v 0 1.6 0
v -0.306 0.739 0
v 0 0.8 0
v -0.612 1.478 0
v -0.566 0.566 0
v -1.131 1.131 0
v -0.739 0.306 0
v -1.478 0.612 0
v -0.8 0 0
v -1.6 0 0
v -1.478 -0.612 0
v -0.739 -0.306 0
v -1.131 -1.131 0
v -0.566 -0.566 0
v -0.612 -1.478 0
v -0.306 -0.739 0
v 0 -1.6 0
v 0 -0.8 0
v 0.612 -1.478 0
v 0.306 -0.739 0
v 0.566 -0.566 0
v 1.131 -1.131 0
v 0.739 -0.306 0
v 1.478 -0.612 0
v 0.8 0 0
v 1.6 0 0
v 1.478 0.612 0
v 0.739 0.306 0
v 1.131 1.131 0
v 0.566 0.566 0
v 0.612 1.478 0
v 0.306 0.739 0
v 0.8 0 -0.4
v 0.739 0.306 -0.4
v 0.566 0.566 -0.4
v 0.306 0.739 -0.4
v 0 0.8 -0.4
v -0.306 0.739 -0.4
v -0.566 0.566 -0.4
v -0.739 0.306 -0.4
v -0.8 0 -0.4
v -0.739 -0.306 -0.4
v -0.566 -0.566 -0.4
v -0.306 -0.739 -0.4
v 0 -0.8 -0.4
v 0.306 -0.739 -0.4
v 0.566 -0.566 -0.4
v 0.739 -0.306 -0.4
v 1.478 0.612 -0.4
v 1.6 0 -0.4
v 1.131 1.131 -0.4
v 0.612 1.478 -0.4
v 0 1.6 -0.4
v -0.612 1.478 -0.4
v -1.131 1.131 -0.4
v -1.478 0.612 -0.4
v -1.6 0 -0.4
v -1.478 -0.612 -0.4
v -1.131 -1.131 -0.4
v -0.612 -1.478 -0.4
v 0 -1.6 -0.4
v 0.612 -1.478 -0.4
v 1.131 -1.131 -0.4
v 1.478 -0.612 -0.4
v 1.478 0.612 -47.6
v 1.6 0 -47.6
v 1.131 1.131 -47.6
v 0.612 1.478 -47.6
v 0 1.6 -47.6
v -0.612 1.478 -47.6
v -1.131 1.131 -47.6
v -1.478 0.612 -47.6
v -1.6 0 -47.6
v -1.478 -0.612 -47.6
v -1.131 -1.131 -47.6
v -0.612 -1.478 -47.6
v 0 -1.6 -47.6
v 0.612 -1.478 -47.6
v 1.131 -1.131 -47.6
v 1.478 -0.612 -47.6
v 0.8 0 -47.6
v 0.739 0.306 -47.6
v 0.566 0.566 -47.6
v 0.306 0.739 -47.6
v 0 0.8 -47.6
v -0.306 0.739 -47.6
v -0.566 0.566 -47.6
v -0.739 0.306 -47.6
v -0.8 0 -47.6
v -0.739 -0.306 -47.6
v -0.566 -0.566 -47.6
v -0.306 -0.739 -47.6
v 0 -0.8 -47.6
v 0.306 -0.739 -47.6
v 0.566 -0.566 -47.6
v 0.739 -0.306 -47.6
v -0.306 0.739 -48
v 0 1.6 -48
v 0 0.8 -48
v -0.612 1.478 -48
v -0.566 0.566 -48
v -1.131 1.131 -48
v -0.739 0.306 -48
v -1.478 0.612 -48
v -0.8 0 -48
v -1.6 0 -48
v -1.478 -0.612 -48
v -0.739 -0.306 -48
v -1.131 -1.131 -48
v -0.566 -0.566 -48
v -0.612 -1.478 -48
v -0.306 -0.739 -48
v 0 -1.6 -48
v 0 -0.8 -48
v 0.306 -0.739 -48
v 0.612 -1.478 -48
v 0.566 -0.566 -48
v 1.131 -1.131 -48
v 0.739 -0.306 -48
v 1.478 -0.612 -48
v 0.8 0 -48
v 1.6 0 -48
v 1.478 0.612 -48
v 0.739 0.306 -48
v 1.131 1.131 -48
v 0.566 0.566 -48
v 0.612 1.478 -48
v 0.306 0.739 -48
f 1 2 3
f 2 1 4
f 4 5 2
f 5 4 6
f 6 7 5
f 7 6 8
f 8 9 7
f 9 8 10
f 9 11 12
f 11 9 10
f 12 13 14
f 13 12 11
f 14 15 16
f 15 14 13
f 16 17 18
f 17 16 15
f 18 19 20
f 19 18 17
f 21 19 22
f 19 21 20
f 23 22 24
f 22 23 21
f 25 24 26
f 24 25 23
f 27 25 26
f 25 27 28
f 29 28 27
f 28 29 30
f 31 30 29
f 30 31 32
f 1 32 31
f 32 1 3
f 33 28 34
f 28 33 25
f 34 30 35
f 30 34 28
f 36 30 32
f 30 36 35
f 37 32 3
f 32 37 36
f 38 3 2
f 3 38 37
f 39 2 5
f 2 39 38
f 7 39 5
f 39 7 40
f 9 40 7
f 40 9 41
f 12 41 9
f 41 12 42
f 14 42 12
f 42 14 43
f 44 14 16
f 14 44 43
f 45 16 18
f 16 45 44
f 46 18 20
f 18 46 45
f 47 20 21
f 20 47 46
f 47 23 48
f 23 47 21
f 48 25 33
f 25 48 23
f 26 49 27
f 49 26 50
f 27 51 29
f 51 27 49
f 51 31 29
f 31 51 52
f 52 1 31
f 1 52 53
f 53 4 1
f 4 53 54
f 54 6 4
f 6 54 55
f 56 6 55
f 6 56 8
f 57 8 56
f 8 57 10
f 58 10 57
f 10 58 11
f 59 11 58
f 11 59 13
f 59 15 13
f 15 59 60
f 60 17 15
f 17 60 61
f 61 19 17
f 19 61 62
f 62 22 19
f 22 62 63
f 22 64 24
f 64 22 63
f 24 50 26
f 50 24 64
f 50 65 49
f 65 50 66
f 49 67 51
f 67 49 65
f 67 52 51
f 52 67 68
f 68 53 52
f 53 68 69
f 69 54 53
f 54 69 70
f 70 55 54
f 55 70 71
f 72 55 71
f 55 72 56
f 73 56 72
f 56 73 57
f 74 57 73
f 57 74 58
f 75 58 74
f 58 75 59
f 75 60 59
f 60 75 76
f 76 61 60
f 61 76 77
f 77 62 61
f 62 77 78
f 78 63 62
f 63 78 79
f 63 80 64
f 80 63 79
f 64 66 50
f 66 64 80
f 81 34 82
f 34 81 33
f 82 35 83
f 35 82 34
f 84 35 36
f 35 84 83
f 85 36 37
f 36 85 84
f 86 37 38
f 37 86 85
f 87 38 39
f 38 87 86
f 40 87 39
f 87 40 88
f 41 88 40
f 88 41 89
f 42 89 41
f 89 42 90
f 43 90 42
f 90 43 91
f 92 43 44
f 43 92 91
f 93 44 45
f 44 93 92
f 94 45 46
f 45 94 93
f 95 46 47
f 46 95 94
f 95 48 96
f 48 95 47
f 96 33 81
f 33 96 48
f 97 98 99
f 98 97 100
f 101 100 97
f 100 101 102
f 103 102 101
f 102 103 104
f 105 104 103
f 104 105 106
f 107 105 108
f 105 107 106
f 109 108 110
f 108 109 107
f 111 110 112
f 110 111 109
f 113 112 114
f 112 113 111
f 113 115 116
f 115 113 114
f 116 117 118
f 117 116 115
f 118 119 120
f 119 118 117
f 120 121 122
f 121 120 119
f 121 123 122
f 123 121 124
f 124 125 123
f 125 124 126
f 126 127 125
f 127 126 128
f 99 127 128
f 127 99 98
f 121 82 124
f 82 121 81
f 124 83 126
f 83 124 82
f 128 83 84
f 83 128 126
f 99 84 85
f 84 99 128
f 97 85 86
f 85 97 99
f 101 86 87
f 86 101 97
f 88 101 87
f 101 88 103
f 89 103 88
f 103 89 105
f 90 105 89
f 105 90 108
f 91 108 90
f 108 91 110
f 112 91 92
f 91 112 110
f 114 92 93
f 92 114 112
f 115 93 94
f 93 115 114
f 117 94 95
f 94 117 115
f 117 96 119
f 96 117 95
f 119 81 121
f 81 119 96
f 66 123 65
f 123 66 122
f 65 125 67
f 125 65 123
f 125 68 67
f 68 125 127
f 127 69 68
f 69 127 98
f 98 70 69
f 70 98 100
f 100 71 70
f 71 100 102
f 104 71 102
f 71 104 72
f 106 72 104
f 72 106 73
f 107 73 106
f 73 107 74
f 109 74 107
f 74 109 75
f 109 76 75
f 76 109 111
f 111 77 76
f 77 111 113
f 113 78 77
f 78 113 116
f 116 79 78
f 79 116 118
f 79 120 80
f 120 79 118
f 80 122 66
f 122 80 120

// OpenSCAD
// file: ../p/4-4disc.scad
use <../lib.scad>
$fa=1; $fs=0.2;
function ldraw_lib__4_4disc(realsolid=false) = [
// 0 Disc 1.0
// 0 Name: 4-4disc.dat
// 0 Author: James Jessiman
// 0 !LDRAW_ORG Primitive UPDATE 2002-02
// 0 !LICENSE Licensed under CC BY 2.0 and CC BY 4.0 : see CAreadme.txt
// 
// 0 BFC CERTIFY CCW
  [0,"BFC","CERTIFY"],
  [0,"BFC","CCW"],
// 
// 0 !HISTORY 1998-12-15 [PTadmin] Official Update 1998-10
// 0 !HISTORY 2002-03-23 [sbliss] Added BFC statement
// 0 !HISTORY 2002-04-25 [PTadmin] Official Update 2002-02
// 0 !HISTORY 2007-06-24 [PTadmin] Header formatted for Contributor Agreement
// 0 !HISTORY 2008-07-01 [PTadmin] Official Update 2008-01
// 
// 
// 3 16 0 0 0 1 0 0 0.9239 0 0.3827
  [3,16,0,0,0,1,0,0,0.9239,0,0.3827],
// 3 16 0 0 0 0.9239 0 0.3827 0.7071 0 0.7071
  [3,16,0,0,0,0.9239,0,0.3827,0.7071,0,0.7071],
// 3 16 0 0 0 0.7071 0 0.7071 0.3827 0 0.9239
  [3,16,0,0,0,0.7071,0,0.7071,0.3827,0,0.9239],
// 3 16 0 0 0 0.3827 0 0.9239 0 0 1
  [3,16,0,0,0,0.3827,0,0.9239,0,0,1],
// 3 16 0 0 0 0 0 1 -0.3827 0 0.9239
  [3,16,0,0,0,0,0,1,-0.3827,0,0.9239],
// 3 16 0 0 0 -0.3827 0 0.9239 -0.7071 0 0.7071
  [3,16,0,0,0,-0.3827,0,0.9239,-0.7071,0,0.7071],
// 3 16 0 0 0 -0.7071 0 0.7071 -0.9239 0 0.3827
  [3,16,0,0,0,-0.7071,0,0.7071,-0.9239,0,0.3827],
// 3 16 0 0 0 -0.9239 0 0.3827 -1 0 -0
  [3,16,0,0,0,-0.9239,0,0.3827,-1,0,-0],
// 3 16 0 0 0 -1 0 -0 -0.9239 0 -0.3827
  [3,16,0,0,0,-1,0,-0,-0.9239,0,-0.3827],
// 3 16 0 0 0 -0.9239 0 -0.3827 -0.7071 0 -0.7071
  [3,16,0,0,0,-0.9239,0,-0.3827,-0.7071,0,-0.7071],
// 3 16 0 0 0 -0.7071 0 -0.7071 -0.3827 0 -0.9239
  [3,16,0,0,0,-0.7071,0,-0.7071,-0.3827,0,-0.9239],
// 3 16 0 0 0 -0.3827 0 -0.9239 0 0 -1
  [3,16,0,0,0,-0.3827,0,-0.9239,0,0,-1],
// 3 16 0 0 0 0 0 -1 0.3827 0 -0.9239
  [3,16,0,0,0,0,0,-1,0.3827,0,-0.9239],
// 3 16 0 0 0 0.3827 0 -0.9239 0.7071 0 -0.7071
  [3,16,0,0,0,0.3827,0,-0.9239,0.7071,0,-0.7071],
// 3 16 0 0 0 0.7071 0 -0.7071 0.9239 0 -0.3827
  [3,16,0,0,0,0.7071,0,-0.7071,0.9239,0,-0.3827],
// 3 16 0 0 0 0.9239 0 -0.3827 1 0 0
  [3,16,0,0,0,0.9239,0,-0.3827,1,0,0],
// 0
];
module ldraw_lib__4_4disc(step=0, col=false, unit=2/5, alt=false, line=0.2, solid=!$preview)
    makepoly(ldraw_lib__4_4disc(solid), step=step, col=col, unit=unit, alt=alt, line=line, solid=solid);
ldraw_lib__4_4disc(line=0.2);
// file: ../p/stud3.scad
use <../lib.scad>
use <4-4cyli.scad>
use <4-4disc.scad>
use <4-4edge.scad>
$fa=1; $fs=0.2;
function ldraw_lib__stud3(realsolid=false) = realsolid ? 
    [openscad(translate([0,0,-eps()], o=cylinder(4+eps(), r=4)),2)] : [
// 0 Stud Tube Solid
// 0 Name: stud3.dat
// 0 Author: James Jessiman
// 0 !LDRAW_ORG Primitive UPDATE 2012-01
// 0 !LICENSE Licensed under CC BY 2.0 and CC BY 4.0 : see CAreadme.txt
// 
// 0 BFC CERTIFY CCW
  [0,"BFC","CERTIFY"],
  [0,"BFC","CCW"],
// 
// 0 !HISTORY 2002-04-04 [sbliss] Modified for BFC compliance
// 0 !HISTORY 2002-04-25 [PTadmin] Official Update 2002-02
// 0 !HISTORY 2007-06-24 [PTadmin] Header formatted for Contributor Agreement
// 0 !HISTORY 2008-07-01 [PTadmin] Official Update 2008-01
// 0 !HISTORY 2012-02-16 [Philo] Changed to CCW
// 0 !HISTORY 2012-03-30 [PTadmin] Official Update 2012-01
// 
// 
// 1 16 0 -4 0 4 0 0 0 1 0 0 0 4 4-4edge.dat
  [1,16,0,-4,0,4,0,0,0,1,0,0,0,4, ldraw_lib__4_4edge(realsolid)],
// 1 16 0 0 0 4 0 0 0 1 0 0 0 4 4-4edge.dat
  [1,16,0,0,0,4,0,0,0,1,0,0,0,4, ldraw_lib__4_4edge(realsolid)],
// 1 16 0 -4 0 4 0 0 0 1 0 0 0 4 4-4disc.dat
  [1,16,0,-4,0,4,0,0,0,1,0,0,0,4, ldraw_lib__4_4disc(realsolid)],
// 1 16 0 -4 0 4 0 0 0 4 0 0 0 4 4-4cyli.dat
  [1,16,0,-4,0,4,0,0,0,4,0,0,0,4, ldraw_lib__4_4cyli(realsolid)],
];
module ldraw_lib__stud3(step=0, col=false, unit=2/5, alt=false, line=0.2, solid=!$preview)
    makepoly(ldraw_lib__stud3(solid), step=step, col=col, unit=unit, alt=alt, line=line, solid=solid);
ldraw_lib__stud3(line=0.2);
// file: ../p/stud.scad
use <../lib.scad>
use <4-4cyli.scad>
use <4-4disc.scad>
use <4-4edge.scad>
$fa=1; $fs=0.2;
function ldraw_lib__stud(realsolid=false) = realsolid ? 
    [openscad(translate([0,0,-eps()], o=cylinder(4+eps(), r=6)),2)] : [
// 0 Stud
// 0 Name: stud.dat
// 0 Author: James Jessiman
// 0 !LDRAW_ORG Primitive UPDATE 2012-01
// 0 !LICENSE Licensed under CC BY 2.0 and CC BY 4.0 : see CAreadme.txt
// 
// 0 BFC CERTIFY CCW
  [0,"BFC","CERTIFY"],
  [0,"BFC","CCW"],
// 
// 0 !HISTORY 2002-04-04 [sbliss] Modified for BFC compliance
// 0 !HISTORY 2002-04-25 [PTadmin] Official Update 2002-02
// 0 !HISTORY 2007-06-24 [PTadmin] Header formatted for Contributor Agreement
// 0 !HISTORY 2008-07-01 [PTadmin] Official Update 2008-01
// 0 !HISTORY 2012-02-16 [Philo] Changed to CCW
// 0 !HISTORY 2012-03-30 [PTadmin] Official Update 2012-01
// 
// 
// 1 16 0 0 0 6 0 0 0 1 0 0 0 6 4-4edge.dat
  [1,16,0,0,0,6,0,0,0,1,0,0,0,6, ldraw_lib__4_4edge(realsolid)],
// 1 16 0 -4 0 6 0 0 0 1 0 0 0 6 4-4edge.dat
  [1,16,0,-4,0,6,0,0,0,1,0,0,0,6, ldraw_lib__4_4edge(realsolid)],
// 1 16 0 0 0 6 0 0 0 -4 0 0 0 6 4-4cyli.dat
  [1,16,0,0,0,6,0,0,0,-4,0,0,0,6, ldraw_lib__4_4cyli(realsolid)],
// 1 16 0 -4 0 6 0 0 0 1 0 0 0 6 4-4disc.dat
  [1,16,0,-4,0,6,0,0,0,1,0,0,0,6, ldraw_lib__4_4disc(realsolid)],
];
module ldraw_lib__stud(step=0, col=false, unit=2/5, alt=false, line=0.2, solid=!$preview)
    makepoly(ldraw_lib__stud(solid), step=step, col=col, unit=unit, alt=alt, line=line, solid=solid);
ldraw_lib__stud(line=0.2);
// file: ../p/box5.scad
use <../lib.scad>
$fa=1; $fs=0.2;
function ldraw_lib__box5(realsolid=false) = [
// 0 Box with 5 Faces and All Edges
// 0 Name: box5.dat
// 0 Author: James Jessiman
// 0 !LDRAW_ORG Primitive UPDATE 2012-01
// 0 !LICENSE Licensed under CC BY 2.0 and CC BY 4.0 : see CAreadme.txt
// 
// 0 BFC CERTIFY CCW
  [0,"BFC","CERTIFY"],
  [0,"BFC","CCW"],
// 
// 0 !HISTORY 2002-04-03 [sbliss] Modified for BFC compliance
// 0 !HISTORY 2002-04-25 [PTadmin] Official Update 2002-02
// 0 !HISTORY 2007-06-24 [PTadmin] Header formatted for Contributor Agreement
// 0 !HISTORY 2008-07-01 [PTadmin] Official Update 2008-01
// 0 !HISTORY 2012-02-16 [Philo] Changed to CCW
// 0 !HISTORY 2012-03-30 [PTadmin] Official Update 2012-01
// 
// 
// 2 24 1 1 1 -1 1 1
  [2,24,1,1,1,-1,1,1],
// 2 24 -1 1 1 -1 1 -1
  [2,24,-1,1,1,-1,1,-1],
// 2 24 -1 1 -1 1 1 -1
  [2,24,-1,1,-1,1,1,-1],
// 2 24 1 1 -1 1 1 1
  [2,24,1,1,-1,1,1,1],
// 2 24 1 0 1 -1 0 1
  [2,24,1,0,1,-1,0,1],
// 2 24 -1 0 1 -1 0 -1
  [2,24,-1,0,1,-1,0,-1],
// 2 24 -1 0 -1 1 0 -1
  [2,24,-1,0,-1,1,0,-1],
// 2 24 1 0 -1 1 0 1
  [2,24,1,0,-1,1,0,1],
// 2 24 1 0 1 1 1 1
  [2,24,1,0,1,1,1,1],
// 2 24 -1 0 1 -1 1 1
  [2,24,-1,0,1,-1,1,1],
// 2 24 1 0 -1 1 1 -1
  [2,24,1,0,-1,1,1,-1],
// 2 24 -1 0 -1 -1 1 -1
  [2,24,-1,0,-1,-1,1,-1],
// 4 16 -1 1 1 1 1 1 1 1 -1 -1 1 -1
  [4,16,-1,1,1,1,1,1,1,1,-1,-1,1,-1],
// 4 16 -1 1 1 -1 0 1 1 0 1 1 1 1
  [4,16,-1,1,1,-1,0,1,1,0,1,1,1,1],
// 4 16 -1 1 -1 -1 0 -1 -1 0 1 -1 1 1
  [4,16,-1,1,-1,-1,0,-1,-1,0,1,-1,1,1],
// 4 16 1 1 -1 1 0 -1 -1 0 -1 -1 1 -1
  [4,16,1,1,-1,1,0,-1,-1,0,-1,-1,1,-1],
// 4 16 1 1 1 1 0 1 1 0 -1 1 1 -1
  [4,16,1,1,1,1,0,1,1,0,-1,1,1,-1],
];
module ldraw_lib__box5(step=0, col=false, unit=2/5, alt=false, line=0.2, solid=!$preview)
    makepoly(ldraw_lib__box5(solid), step=step, col=col, unit=unit, alt=alt, line=line, solid=solid);
ldraw_lib__box5(line=0.2);
// file: ../p/box4t.scad
use <../lib.scad>
$fa=1; $fs=0.2;
function ldraw_lib__box4t(realsolid=false) = [
// 0 Box with 4 Adjacent Faces and All Edges
// 0 Name: box4t.dat
// 0 Author: Tore Eriksson [Tore_Eriksson]
// 0 !LDRAW_ORG Primitive UPDATE 2003-02
// 0 !LICENSE Licensed under CC BY 2.0 and CC BY 4.0 : see CAreadme.txt
// 
// 0 BFC CERTIFY CCW
  [0,"BFC","CERTIFY"],
  [0,"BFC","CCW"],
// 
// 0 !HISTORY 1997-09-29 [PTadmin] Official Update 1997-15
// 0 !HISTORY 2002-08-31 [izanette] Modified with WINDZ for BFC compliance
// 0 !HISTORY 2003-08-01 [PTadmin] Official Update 2003-02
// 0 !HISTORY 2007-06-24 [PTadmin] Header formatted for Contributor Agreement
// 0 !HISTORY 2008-07-01 [PTadmin] Official Update 2008-01
// 
// 
// 2 24 1 1 1 -1 1 1
  [2,24,1,1,1,-1,1,1],
// 2 24 -1 1 1 -1 1 -1
  [2,24,-1,1,1,-1,1,-1],
// 2 24 -1 1 -1 1 1 -1
  [2,24,-1,1,-1,1,1,-1],
// 2 24 1 1 -1 1 1 1
  [2,24,1,1,-1,1,1,1],
// 2 24 1 0 1 -1 0 1
  [2,24,1,0,1,-1,0,1],
// 2 24 -1 0 1 -1 0 -1
  [2,24,-1,0,1,-1,0,-1],
// 2 24 -1 0 -1 1 0 -1
  [2,24,-1,0,-1,1,0,-1],
// 2 24 1 0 -1 1 0 1
  [2,24,1,0,-1,1,0,1],
// 2 24 1 0 1 1 1 1
  [2,24,1,0,1,1,1,1],
// 2 24 -1 0 1 -1 1 1
  [2,24,-1,0,1,-1,1,1],
// 2 24 1 0 -1 1 1 -1
  [2,24,1,0,-1,1,1,-1],
// 2 24 -1 0 -1 -1 1 -1
  [2,24,-1,0,-1,-1,1,-1],
// 4 16 1 1 1 1 1 -1 -1 1 -1 -1 1 1
  [4,16,1,1,1,1,1,-1,-1,1,-1,-1,1,1],
// 4 16 1 1 1 -1 1 1 -1 0 1 1 0 1
  [4,16,1,1,1,-1,1,1,-1,0,1,1,0,1],
// 4 16 -1 1 1 -1 1 -1 -1 0 -1 -1 0 1
  [4,16,-1,1,1,-1,1,-1,-1,0,-1,-1,0,1],
// 0 4 16 -1 1 -1 -1 0 -1 1 0 -1 1 1 -1
// 4 16 1 1 -1 1 1 1 1 0 1 1 0 -1
  [4,16,1,1,-1,1,1,1,1,0,1,1,0,-1],
// 0
];
module ldraw_lib__box4t(step=0, col=false, unit=2/5, alt=false, line=0.2, solid=!$preview)
    makepoly(ldraw_lib__box4t(solid), step=step, col=col, unit=unit, alt=alt, line=line, solid=solid);
ldraw_lib__box4t(line=0.2);
// file: s/3004s01.scad
use <../../lib.scad>
use <../../p/box4t.scad>
use <../../p/box5.scad>
use <../../p/stud.scad>
use <../../p/stud3.scad>
$fa=1; $fs=0.2;
function ldraw_lib__s__3004s01(realsolid=false) = [
// 0 ~Brick  1 x  2 without Front Face
// 0 Name: s\3004s01.dat
// 0 Author: James Jessiman
// 0 !LDRAW_ORG Subpart UPDATE 2003-03
// 0 !LICENSE Licensed under CC BY 2.0 and CC BY 4.0 : see CAreadme.txt
// 
// 0 BFC CERTIFY CCW
  [0,"BFC","CERTIFY"],
  [0,"BFC","CCW"],
// 
// 0 !HISTORY 2003-09-07 [jriley] Subfiling, BFC
// 0 !HISTORY 2003-12-19 [PTadmin] Official Update 2003-03
// 0 !HISTORY 2007-08-29 [PTadmin] Header formatted for Contributor Agreement
// 0 !HISTORY 2008-07-01 [PTadmin] Official Update 2008-01
// 
// 
// 1 16 0 4 0 1 0 0 0 -5 0 0 0 1 stud3.dat
  [1,16,0,4,0,1,0,0,0,-5,0,0,0,1, ldraw_lib__stud3(realsolid)],
// 0 BFC INVERTNEXT
  [0,"BFC","INVERTNEXT"],
// 1 16 0 24 0 16 0 0 0 -20 0 0 0 6 box5.dat
  [1,16,0,24,0,16,0,0,0,-20,0,0,0,6, ldraw_lib__box5(realsolid)],
// 4 16 20 24 10 16 24 6 -16 24 6 -20 24 10
  [4,16,20,24,10,16,24,6,-16,24,6,-20,24,10],
// 4 16 -20 24 10 -16 24 6 -16 24 -6 -20 24 -10
  [4,16,-20,24,10,-16,24,6,-16,24,-6,-20,24,-10],
// 4 16 -20 24 -10 -16 24 -6 16 24 -6 20 24 -10
  [4,16,-20,24,-10,-16,24,-6,16,24,-6,20,24,-10],
// 4 16 20 24 -10 16 24 -6 16 24 6 20 24 10
  [4,16,20,24,-10,16,24,-6,16,24,6,20,24,10],
// 1 16 0 24 0 20 0 0 0 -24 0 0 0 10 box4t.dat
  [1,16,0,24,0,20,0,0,0,-24,0,0,0,10, ldraw_lib__box4t(realsolid)],
// 1 16 10 0 0 1 0 0 0 1 0 0 0 1 stud.dat
  [1,16,10,0,0,1,0,0,0,1,0,0,0,1, ldraw_lib__stud(realsolid)],
// 1 16 -10 0 0 1 0 0 0 1 0 0 0 1 stud.dat
  [1,16,-10,0,0,1,0,0,0,1,0,0,0,1, ldraw_lib__stud(realsolid)],
// 0
];
module ldraw_lib__s__3004s01(step=0, col=false, unit=2/5, alt=false, line=0.2, solid=!$preview)
    makepoly(ldraw_lib__s__3004s01(solid), step=step, col=col, unit=unit, alt=alt, line=line, solid=solid);
ldraw_lib__s__3004s01(line=0.2);
// file: ../p/4-4ring1.scad
use <../lib.scad>
$fa=1; $fs=0.2;
function ldraw_lib__4_4ring1(realsolid=false) = [
// 0 Ring  1 x 1.0
// 0 Name: 4-4ring1.dat
// 0 Author: James Jessiman
// 0 !LDRAW_ORG Primitive UPDATE 2009-01
// 0 !LICENSE Licensed under CC BY 2.0 and CC BY 4.0 : see CAreadme.txt
// 
// 0 BFC CERTIFY CCW
  [0,"BFC","CERTIFY"],
  [0,"BFC","CCW"],
// 
// 0 !HISTORY 1998-12-15 [PTadmin] Official Update 1998-10
// 0 !HISTORY 2002-04-08 [BrickCaster] Modified for BFC compliance
// 0 !HISTORY 2002-04-25 [PTadmin] Official Update 2002-02
// 0 !HISTORY 2007-06-24 [PTadmin] Header formatted for Contributor Agreement
// 0 !HISTORY 2008-07-01 [PTadmin] Official Update 2008-01
// 0 !HISTORY 2008-08-26 [cwdee] Switch polygon winding and rename
// 0 !HISTORY 2009-05-02 [PTadmin] Official Update 2009-01
// 
// 
// 4 16 -0.7654 0 1.8478 -0.3827 0 0.9239 0 0 1 0 0 2
  [4,16,-0.7654,0,1.8478,-0.3827,0,0.9239,0,0,1,0,0,2],
// 4 16 -1.4142 0 1.4142 -0.7071 0 0.7071 -0.3827 0 0.9239 -0.7654 0 1.8478
  [4,16,-1.4142,0,1.4142,-0.7071,0,0.7071,-0.3827,0,0.9239,-0.7654,0,1.8478],
// 4 16 -1.8478 0 0.7654 -0.9239 0 0.3827 -0.7071 0 0.7071 -1.4142 0 1.41420
  [4,16,-1.8478,0,0.7654,-0.9239,0,0.3827,-0.7071,0,0.7071,-1.4142,0,1.41420],
// 4 16 -2 0 0 -1 0 0 -0.9239 0 0.3827 -1.8478 0 0.7654
  [4,16,-2,0,0,-1,0,0,-0.9239,0,0.3827,-1.8478,0,0.7654],
// 4 16 -1.8478 0 -0.7654 -0.9239 0 -0.3827 -1 0 0 -2 0 0
  [4,16,-1.8478,0,-0.7654,-0.9239,0,-0.3827,-1,0,0,-2,0,0],
// 4 16 -1.4142 0 -1.4142 -0.7071 0 -0.7071 -0.9239 0 -0.3827 -1.8478 0 -0.7654
  [4,16,-1.4142,0,-1.4142,-0.7071,0,-0.7071,-0.9239,0,-0.3827,-1.8478,0,-0.7654],
// 4 16 -0.7654 0 -1.8478 -0.3827 0 -0.9239 -0.7071 0 -0.7071 -1.4142 0 -1.4142
  [4,16,-0.7654,0,-1.8478,-0.3827,0,-0.9239,-0.7071,0,-0.7071,-1.4142,0,-1.4142],
// 4 16 0 0 -2 0 0 -1 -0.3827 0 -0.9239 -0.7654 0 -1.8478
  [4,16,0,0,-2,0,0,-1,-0.3827,0,-0.9239,-0.7654,0,-1.8478],
// 4 16 0.7654 0 -1.8478 0.3827 0 -0.9239 0 0 -1 0 0 -2
  [4,16,0.7654,0,-1.8478,0.3827,0,-0.9239,0,0,-1,0,0,-2],
// 4 16 1.4142 0 -1.4142 0.7071 0 -0.7071 0.3827 0 -0.9239 0.7654 0 -1.8478
  [4,16,1.4142,0,-1.4142,0.7071,0,-0.7071,0.3827,0,-0.9239,0.7654,0,-1.8478],
// 4 16 1.8478 0 -0.7654 0.9239 0 -0.3827 0.7071 0 -0.7071 1.4142 0 -1.4142
  [4,16,1.8478,0,-0.7654,0.9239,0,-0.3827,0.7071,0,-0.7071,1.4142,0,-1.4142],
// 4 16 2 0 0 1 0 0 0.9239 0 -0.3827 1.8478 0 -0.7654
  [4,16,2,0,0,1,0,0,0.9239,0,-0.3827,1.8478,0,-0.7654],
// 4 16 1.8478 0 0.7654 0.9239 0 0.3827 1 0 0 2 0 0
  [4,16,1.8478,0,0.7654,0.9239,0,0.3827,1,0,0,2,0,0],
// 4 16 1.4142 0 1.4142 0.7071 0 0.7071 0.9239 0 0.3827 1.8478 0 0.7654
  [4,16,1.4142,0,1.4142,0.7071,0,0.7071,0.9239,0,0.3827,1.8478,0,0.7654],
// 4 16 0.7654 0 1.8478 0.3827 0 0.9239 0.7071 0 0.7071 1.4142 0 1.4142
  [4,16,0.7654,0,1.8478,0.3827,0,0.9239,0.7071,0,0.7071,1.4142,0,1.4142],
// 4 16 0 0 2 0 0 1 0.3827 0 0.9239 0.7654 0 1.8478
  [4,16,0,0,2,0,0,1,0.3827,0,0.9239,0.7654,0,1.8478],
// 0
];
module ldraw_lib__4_4ring1(step=0, col=false, unit=2/5, alt=false, line=0.2, solid=!$preview)
    makepoly(ldraw_lib__4_4ring1(solid), step=step, col=col, unit=unit, alt=alt, line=line, solid=solid);
ldraw_lib__4_4ring1(line=0.2);
// file: ../p/4-4edge.scad
use <../lib.scad>
$fa=1; $fs=0.2;
function ldraw_lib__4_4edge(realsolid=false) = [
// 0 Circle 1.0
// 0 Name: 4-4edge.dat
// 0 Author: James Jessiman
// 0 !LDRAW_ORG Primitive UPDATE 2017-01
// 0 !LICENSE Licensed under CC BY 2.0 and CC BY 4.0 : see CAreadme.txt
// 
// 0 BFC CERTIFY CCW
  [0,"BFC","CERTIFY"],
  [0,"BFC","CCW"],
// 
// 0 !HISTORY 1998-12-15 [PTadmin] Official Update 1998-10
// 0 !HISTORY 2005-12-28 [PTadmin] Official Update 2005-01
// 0 !HISTORY 2007-06-24 [PTadmin] Header formatted for Contributor Agreement
// 0 !HISTORY 2008-07-01 [PTadmin] Official Update 2008-01
// 0 !HISTORY 2017-01-15 [Steffen] BFCed
// 0 !HISTORY 2017-12-30 [PTadmin] Official Update 2017-01
// 
// 
// 2 24 1 0 0 0.9239 0 0.3827
  [2,24,1,0,0,0.9239,0,0.3827],
// 2 24 0.9239 0 0.3827 0.7071 0 0.7071
  [2,24,0.9239,0,0.3827,0.7071,0,0.7071],
// 2 24 0.7071 0 0.7071 0.3827 0 0.9239
  [2,24,0.7071,0,0.7071,0.3827,0,0.9239],
// 2 24 0.3827 0 0.9239 0 0 1
  [2,24,0.3827,0,0.9239,0,0,1],
// 2 24 0 0 1 -0.3827 0 0.9239
  [2,24,0,0,1,-0.3827,0,0.9239],
// 2 24 -0.3827 0 0.9239 -0.7071 0 0.7071
  [2,24,-0.3827,0,0.9239,-0.7071,0,0.7071],
// 2 24 -0.7071 0 0.7071 -0.9239 0 0.3827
  [2,24,-0.7071,0,0.7071,-0.9239,0,0.3827],
// 2 24 -0.9239 0 0.3827 -1 0 -0
  [2,24,-0.9239,0,0.3827,-1,0,-0],
// 2 24 -1 0 -0 -0.9239 0 -0.3827
  [2,24,-1,0,-0,-0.9239,0,-0.3827],
// 2 24 -0.9239 0 -0.3827 -0.7071 0 -0.7071
  [2,24,-0.9239,0,-0.3827,-0.7071,0,-0.7071],
// 2 24 -0.7071 0 -0.7071 -0.3827 0 -0.9239
  [2,24,-0.7071,0,-0.7071,-0.3827,0,-0.9239],
// 2 24 -0.3827 0 -0.9239 0 0 -1
  [2,24,-0.3827,0,-0.9239,0,0,-1],
// 2 24 0 0 -1 0.3827 0 -0.9239
  [2,24,0,0,-1,0.3827,0,-0.9239],
// 2 24 0.3827 0 -0.9239 0.7071 0 -0.7071
  [2,24,0.3827,0,-0.9239,0.7071,0,-0.7071],
// 2 24 0.7071 0 -0.7071 0.9239 0 -0.3827
  [2,24,0.7071,0,-0.7071,0.9239,0,-0.3827],
// 2 24 0.9239 0 -0.3827 1 0 0
  [2,24,0.9239,0,-0.3827,1,0,0],
];
module ldraw_lib__4_4edge(step=0, col=false, unit=2/5, alt=false, line=0.2, solid=!$preview)
    makepoly(ldraw_lib__4_4edge(solid), step=step, col=col, unit=unit, alt=alt, line=line, solid=solid);
ldraw_lib__4_4edge(line=0.2);
// file: ../p/4-4cyli.scad
use <../lib.scad>
$fa=1; $fs=0.2;
function ldraw_lib__4_4cyli(realsolid=false) = [
// 0 Cylinder 1.0
// 0 Name: 4-4cyli.dat
// 0 Author: James Jessiman
// 0 !LDRAW_ORG Primitive UPDATE 2005-01
// 0 !LICENSE Licensed under CC BY 2.0 and CC BY 4.0 : see CAreadme.txt
// 
// 0 BFC CERTIFY CCW
  [0,"BFC","CERTIFY"],
  [0,"BFC","CCW"],
// 
// 0 !HISTORY 1998-12-15 [PTadmin] Official Update 1998-10
// 0 !HISTORY 2002-03-23 [sbliss] Added BFC statement; merged headers from files in distributions LDraw 0.27 and Complete.
// 0 !HISTORY 2002-04-25 [PTadmin] Official Update 2002-02
// 0 !HISTORY 2004-12-14 [guyvivan] BFC CCW
// 0 !HISTORY 2005-12-28 [PTadmin] Official Update 2005-01
// 0 !HISTORY 2007-06-24 [PTadmin] Header formatted for Contributor Agreement
// 0 !HISTORY 2008-07-01 [PTadmin] Official Update 2008-01
// 
// 
// 4 16 1 1 0 0.9239 1 0.3827 0.9239 0 0.3827 1 0 0
  [4,16,1,1,0,0.9239,1,0.3827,0.9239,0,0.3827,1,0,0],
// 5 24 1 0 0 1 1 0 0.9239 0 0.3827 0.9239 0 -0.3827
  [5,24,1,0,0,1,1,0,0.9239,0,0.3827,0.9239,0,-0.3827],
// 4 16 0.9239 1 0.3827 0.7071 1 0.7071 0.7071 0 0.7071 0.9239 0 0.3827
  [4,16,0.9239,1,0.3827,0.7071,1,0.7071,0.7071,0,0.7071,0.9239,0,0.3827],
// 5 24 0.9239 0 0.3827 0.9239 1 0.3827 0.7071 0 0.7071 1 0 0
  [5,24,0.9239,0,0.3827,0.9239,1,0.3827,0.7071,0,0.7071,1,0,0],
// 4 16 0.7071 1 0.7071 0.3827 1 0.9239 0.3827 0 0.9239 0.7071 0 0.7071
  [4,16,0.7071,1,0.7071,0.3827,1,0.9239,0.3827,0,0.9239,0.7071,0,0.7071],
// 5 24 0.7071 0 0.7071 0.7071 1 0.7071 0.3827 0 0.9239 0.9239 0 0.3827
  [5,24,0.7071,0,0.7071,0.7071,1,0.7071,0.3827,0,0.9239,0.9239,0,0.3827],
// 4 16 0.3827 1 0.9239 0 1 1 0 0 1 0.3827 0 0.9239
  [4,16,0.3827,1,0.9239,0,1,1,0,0,1,0.3827,0,0.9239],
// 5 24 0.3827 0 0.9239 0.3827 1 0.9239 0 0 1 0.7071 0 0.7071
  [5,24,0.3827,0,0.9239,0.3827,1,0.9239,0,0,1,0.7071,0,0.7071],
// 4 16 0 1 1 -0.3827 1 0.9239 -0.3827 0 0.9239 0 0 1
  [4,16,0,1,1,-0.3827,1,0.9239,-0.3827,0,0.9239,0,0,1],
// 5 24 0 0 1 0 1 1 -0.3827 0 0.9239 0.3827 0 0.9239
  [5,24,0,0,1,0,1,1,-0.3827,0,0.9239,0.3827,0,0.9239],
// 4 16 -0.3827 1 0.9239 -0.7071 1 0.7071 -0.7071 0 0.7071 -0.3827 0 0.9239
  [4,16,-0.3827,1,0.9239,-0.7071,1,0.7071,-0.7071,0,0.7071,-0.3827,0,0.9239],
// 5 24 -0.3827 0 0.9239 -0.3827 1 0.9239 -0.7071 0 0.7071 0 0 1
  [5,24,-0.3827,0,0.9239,-0.3827,1,0.9239,-0.7071,0,0.7071,0,0,1],
// 4 16 -0.7071 1 0.7071 -0.9239 1 0.3827 -0.9239 0 0.3827 -0.7071 0 0.7071
  [4,16,-0.7071,1,0.7071,-0.9239,1,0.3827,-0.9239,0,0.3827,-0.7071,0,0.7071],
// 5 24 -0.7071 0 0.7071 -0.7071 1 0.7071 -0.9239 0 0.3827 -0.3827 0 0.9239
  [5,24,-0.7071,0,0.7071,-0.7071,1,0.7071,-0.9239,0,0.3827,-0.3827,0,0.9239],
// 4 16 -0.9239 1 0.3827 -1 1 0 -1 0 0 -0.9239 0 0.3827
  [4,16,-0.9239,1,0.3827,-1,1,0,-1,0,0,-0.9239,0,0.3827],
// 5 24 -0.9239 0 0.3827 -0.9239 1 0.3827 -1 0 0 -0.7071 0 0.7071
  [5,24,-0.9239,0,0.3827,-0.9239,1,0.3827,-1,0,0,-0.7071,0,0.7071],
// 4 16 -1 1 0 -0.9239 1 -0.3827 -0.9239 0 -0.3827 -1 0 0
  [4,16,-1,1,0,-0.9239,1,-0.3827,-0.9239,0,-0.3827,-1,0,0],
// 5 24 -1 0 0 -1 1 0 -0.9239 0 -0.3827 -0.9239 0 0.3827
  [5,24,-1,0,0,-1,1,0,-0.9239,0,-0.3827,-0.9239,0,0.3827],
// 4 16 -0.9239 1 -0.3827 -0.7071 1 -0.7071 -0.7071 0 -0.7071 -0.9239 0 -0.3827
  [4,16,-0.9239,1,-0.3827,-0.7071,1,-0.7071,-0.7071,0,-0.7071,-0.9239,0,-0.3827],
// 5 24 -0.9239 0 -0.3827 -0.9239 1 -0.3827 -0.7071 0 -0.7071 -1 0 0
  [5,24,-0.9239,0,-0.3827,-0.9239,1,-0.3827,-0.7071,0,-0.7071,-1,0,0],
// 4 16 -0.7071 1 -0.7071 -0.3827 1 -0.9239 -0.3827 0 -0.9239 -0.7071 0 -0.7071
  [4,16,-0.7071,1,-0.7071,-0.3827,1,-0.9239,-0.3827,0,-0.9239,-0.7071,0,-0.7071],
// 5 24 -0.7071 0 -0.7071 -0.7071 1 -0.7071 -0.3827 0 -0.9239 -0.9239 0 -0.3827
  [5,24,-0.7071,0,-0.7071,-0.7071,1,-0.7071,-0.3827,0,-0.9239,-0.9239,0,-0.3827],
// 4 16 -0.3827 1 -0.9239 0 1 -1 0 0 -1 -0.3827 0 -0.9239
  [4,16,-0.3827,1,-0.9239,0,1,-1,0,0,-1,-0.3827,0,-0.9239],
// 5 24 -0.3827 0 -0.9239 -0.3827 1 -0.9239 0 0 -1 -0.7071 0 -0.7071
  [5,24,-0.3827,0,-0.9239,-0.3827,1,-0.9239,0,0,-1,-0.7071,0,-0.7071],
// 4 16 0 1 -1 0.3827 1 -0.9239 0.3827 0 -0.9239 0 0 -1
  [4,16,0,1,-1,0.3827,1,-0.9239,0.3827,0,-0.9239,0,0,-1],
// 5 24 0 0 -1 0 1 -1 0.3827 0 -0.9239 -0.3827 0 -0.9239
  [5,24,0,0,-1,0,1,-1,0.3827,0,-0.9239,-0.3827,0,-0.9239],
// 4 16 0.3827 1 -0.9239 0.7071 1 -0.7071 0.7071 0 -0.7071 0.3827 0 -0.9239
  [4,16,0.3827,1,-0.9239,0.7071,1,-0.7071,0.7071,0,-0.7071,0.3827,0,-0.9239],
// 5 24 0.3827 0 -0.9239 0.3827 1 -0.9239 0.7071 0 -0.7071 0 0 -1
  [5,24,0.3827,0,-0.9239,0.3827,1,-0.9239,0.7071,0,-0.7071,0,0,-1],
// 4 16 0.7071 1 -0.7071 0.9239 1 -0.3827 0.9239 0 -0.3827 0.7071 0 -0.7071
  [4,16,0.7071,1,-0.7071,0.9239,1,-0.3827,0.9239,0,-0.3827,0.7071,0,-0.7071],
// 5 24 0.7071 0 -0.7071 0.7071 1 -0.7071 0.9239 0 -0.3827 0.3827 0 -0.9239
  [5,24,0.7071,0,-0.7071,0.7071,1,-0.7071,0.9239,0,-0.3827,0.3827,0,-0.9239],
// 4 16 0.9239 1 -0.3827 1 1 0 1 0 0 0.9239 0 -0.3827
  [4,16,0.9239,1,-0.3827,1,1,0,1,0,0,0.9239,0,-0.3827],
// 5 24 0.9239 0 -0.3827 0.9239 1 -0.3827 1 0 0 0.7071 0 -0.7071
  [5,24,0.9239,0,-0.3827,0.9239,1,-0.3827,1,0,0,0.7071,0,-0.7071],
// 0
];
module ldraw_lib__4_4cyli(step=0, col=false, unit=2/5, alt=false, line=0.2, solid=!$preview)
    makepoly(ldraw_lib__4_4cyli(solid), step=step, col=col, unit=unit, alt=alt, line=line, solid=solid);
ldraw_lib__4_4cyli(line=0.2);
// file: 3004.scad
use <../lib.scad>
use <s/3004s01.scad>
$fa=1; $fs=0.2;
function ldraw_lib__3004(realsolid=false) = [
// 0 Brick  1 x  2
// 0 Name: 3004.dat
// 0 Author: James Jessiman
// 0 !LDRAW_ORG Part UPDATE 2022-05
// 0 !LICENSE Licensed under CC BY 2.0 and CC BY 4.0 : see CAreadme.txt
// 
// 0 BFC CERTIFY CCW
  [0,"BFC","CERTIFY"],
  [0,"BFC","CCW"],
// 
// 0 !HISTORY 2001-10-26 [PTadmin] Official Update 2001-01
// 0 !HISTORY 2002-05-07 {unknown} BFC Certification
// 0 !HISTORY 2002-06-11 [PTadmin] Official Update 2002-03
// 0 !HISTORY 2007-05-07 [PTadmin] Header formatted for Contributor Agreement
// 0 !HISTORY 2008-07-01 [PTadmin] Official Update 2008-01
// 0 !HISTORY 2022-08-04 [MagFors] Using subfile
// 0 !HISTORY 2022-09-15 [PTadmin] Official Update 2022-05
// 
// 
// 1 16 0 0 0 1 0 0 0 1 0 0 0 1 s\3004s01.dat
  [1,16,0,0,0,1,0,0,0,1,0,0,0,1, ldraw_lib__s__3004s01(realsolid)],
// 4 16 -20 24 -10 20 24 -10 20 0 -10 -20 0 -10
  [4,16,-20,24,-10,20,24,-10,20,0,-10,-20,0,-10],
];
module ldraw_lib__3004(step=0, col=false, unit=2/5, alt=false, line=0.2, solid=!$preview)
    makepoly(ldraw_lib__3004(solid), step=step, col=col, unit=unit, alt=alt, line=line, solid=solid);
ldraw_lib__3004(line=0.2);
// file: u9053.scad
use <../lib.scad>
use <../p/4-4cyli.scad>
use <../p/4-4edge.scad>
use <../p/4-4ring1.scad>
$fa=1; $fs=0.2;
function ldraw_lib__u9053(realsolid=false) = [
// 0 ~Technic Flex-System Hose End
// 0 Name: u9053.dat
// 0 Author: William Howard [WilliamH]
// 0 !LDRAW_ORG Part UPDATE 2011-02
// 0 !LICENSE Licensed under CC BY 2.0 and CC BY 4.0 : see CAreadme.txt
// 
// 0 BFC CERTIFY CCW
  [0,"BFC","CERTIFY"],
  [0,"BFC","CCW"],
// 
// 0 !HISTORY 2011-12-21 [cwdee] Reworked subparting technique
// 0 !HISTORY 2011-12-23 [PTadmin] Renamed from 76
// 0 !HISTORY 2011-12-29 [PTadmin] Official Update 2011-02
// 
// 
// 1 16 0 0 0 2 0 0 0 1 0 0 0 2 4-4ring1.dat
  [1,16,0,0,0,2,0,0,0,1,0,0,0,2, ldraw_lib__4_4ring1(realsolid)],
// 1 16 0 0 0 2 0 0 0 1 0 0 0 2 4-4edge.dat
  [1,16,0,0,0,2,0,0,0,1,0,0,0,2, ldraw_lib__4_4edge(realsolid)],
// 0 BFC INVERTNEXT
  [0,"BFC","INVERTNEXT"],
// 1 16 0 0 0 2 0 0 0 1 0 0 0 2 4-4cyli.dat
  [1,16,0,0,0,2,0,0,0,1,0,0,0,2, ldraw_lib__4_4cyli(realsolid)],
// 1 16 0 0 0 4 0 0 0 1 0 0 0 4 4-4edge.dat
  [1,16,0,0,0,4,0,0,0,1,0,0,0,4, ldraw_lib__4_4edge(realsolid)],
// 1 16 0 0 0 4 0 0 0 1 0 0 0 4 4-4cyli.dat
  [1,16,0,0,0,4,0,0,0,1,0,0,0,4, ldraw_lib__4_4cyli(realsolid)],
// 0
];
module ldraw_lib__u9053(step=0, col=false, unit=2/5, alt=false, line=0.2, solid=!$preview)
    makepoly(ldraw_lib__u9053(solid), step=step, col=col, unit=unit, alt=alt, line=line, solid=solid);
ldraw_lib__u9053(line=0.2);
// file: 77.scad
use <../lib.scad>
use <../p/4-4cyli.scad>
$fa=1; $fs=0.2;
function ldraw_lib__77(realsolid=false) = [
// 0 ~Technic Flex-System Hose Segment
// 0 Name: 77.dat
// 0 Author: William Howard [WilliamH]
// 0 !LDRAW_ORG Part UPDATE 2011-02
// 0 !LICENSE Licensed under CC BY 2.0 and CC BY 4.0 : see CAreadme.txt
// 
// 0 BFC CERTIFY CCW
  [0,"BFC","CERTIFY"],
  [0,"BFC","CCW"],
// 
// 0 !HISTORY 2011-12-21 [cwdee] Reworked subparting technique
// 0 !HISTORY 2011-12-29 [PTadmin] Official Update 2011-02
// 
// 
// 1 16 0 0 0 4 0 0 0 1 0 0 0 4 4-4cyli.dat
  [1,16,0,0,0,4,0,0,0,1,0,0,0,4, ldraw_lib__4_4cyli(realsolid)],
// 0 BFC INVERTNEXT
  [0,"BFC","INVERTNEXT"],
// 1 16 0 0 0 2 0 0 0 1 0 0 0 2 4-4cyli.dat
  [1,16,0,0,0,2,0,0,0,1,0,0,0,2, ldraw_lib__4_4cyli(realsolid)],
// 0
];
module ldraw_lib__77(step=0, col=false, unit=2/5, alt=false, line=0.2, solid=!$preview)
    makepoly(ldraw_lib__77(solid), step=step, col=col, unit=unit, alt=alt, line=line, solid=solid);
ldraw_lib__77(line=0.2);
// main file
use <../lib.scad>
use <77.scad>
use <u9053.scad>
$fa=1; $fs=0.2;
function ldraw_lib__76279(realsolid=false) = [
// 0 Technic Flex-System Hose  6L (120LDU)
// 0 Name: 76279.dat
// 0 Author: William Howard [WilliamH]
// 0 !LDRAW_ORG Part UPDATE 2011-02
// 0 !LICENSE Licensed under CC BY 2.0 and CC BY 4.0 : see CAreadme.txt
// 
// 0 BFC CERTIFY CCW
  [0,"BFC","CERTIFY"],
  [0,"BFC","CCW"],
// 
// 0 !KEYWORDS bar, tube
// 
// 0 !HISTORY 2011-12-21 [cwdee] Reworked subparting technique
// 0 !HISTORY 2011-12-29 [PTadmin] Official Update 2011-02
// 
// 
// 1 16 0 0 0 1 0 0 0 1 0 0 0 1 u9053.dat
  [1,16,0,0,0,1,0,0,0,1,0,0,0,1, ldraw_lib__u9053(realsolid)],
// 1 16 0 1 0 1 0 0 0 118 0 0 0 1 77.dat
  [1,16,0,1,0,1,0,0,0,118,0,0,0,1, ldraw_lib__77(realsolid)],
// 1 16 0 120 0 1 0 0 0 -1 0 0 0 1 u9053.dat
  [1,16,0,120,0,1,0,0,0,-1,0,0,0,1, ldraw_lib__u9053(realsolid)],
];
module ldraw_lib__76279(step=0, col=false, unit=2/5, alt=false, line=0.2, solid=!$preview)
    makepoly(ldraw_lib__76279(solid), step=step, col=col, unit=unit, alt=alt, line=line, solid=solid);
ldraw_lib__76279(line=0.2);
